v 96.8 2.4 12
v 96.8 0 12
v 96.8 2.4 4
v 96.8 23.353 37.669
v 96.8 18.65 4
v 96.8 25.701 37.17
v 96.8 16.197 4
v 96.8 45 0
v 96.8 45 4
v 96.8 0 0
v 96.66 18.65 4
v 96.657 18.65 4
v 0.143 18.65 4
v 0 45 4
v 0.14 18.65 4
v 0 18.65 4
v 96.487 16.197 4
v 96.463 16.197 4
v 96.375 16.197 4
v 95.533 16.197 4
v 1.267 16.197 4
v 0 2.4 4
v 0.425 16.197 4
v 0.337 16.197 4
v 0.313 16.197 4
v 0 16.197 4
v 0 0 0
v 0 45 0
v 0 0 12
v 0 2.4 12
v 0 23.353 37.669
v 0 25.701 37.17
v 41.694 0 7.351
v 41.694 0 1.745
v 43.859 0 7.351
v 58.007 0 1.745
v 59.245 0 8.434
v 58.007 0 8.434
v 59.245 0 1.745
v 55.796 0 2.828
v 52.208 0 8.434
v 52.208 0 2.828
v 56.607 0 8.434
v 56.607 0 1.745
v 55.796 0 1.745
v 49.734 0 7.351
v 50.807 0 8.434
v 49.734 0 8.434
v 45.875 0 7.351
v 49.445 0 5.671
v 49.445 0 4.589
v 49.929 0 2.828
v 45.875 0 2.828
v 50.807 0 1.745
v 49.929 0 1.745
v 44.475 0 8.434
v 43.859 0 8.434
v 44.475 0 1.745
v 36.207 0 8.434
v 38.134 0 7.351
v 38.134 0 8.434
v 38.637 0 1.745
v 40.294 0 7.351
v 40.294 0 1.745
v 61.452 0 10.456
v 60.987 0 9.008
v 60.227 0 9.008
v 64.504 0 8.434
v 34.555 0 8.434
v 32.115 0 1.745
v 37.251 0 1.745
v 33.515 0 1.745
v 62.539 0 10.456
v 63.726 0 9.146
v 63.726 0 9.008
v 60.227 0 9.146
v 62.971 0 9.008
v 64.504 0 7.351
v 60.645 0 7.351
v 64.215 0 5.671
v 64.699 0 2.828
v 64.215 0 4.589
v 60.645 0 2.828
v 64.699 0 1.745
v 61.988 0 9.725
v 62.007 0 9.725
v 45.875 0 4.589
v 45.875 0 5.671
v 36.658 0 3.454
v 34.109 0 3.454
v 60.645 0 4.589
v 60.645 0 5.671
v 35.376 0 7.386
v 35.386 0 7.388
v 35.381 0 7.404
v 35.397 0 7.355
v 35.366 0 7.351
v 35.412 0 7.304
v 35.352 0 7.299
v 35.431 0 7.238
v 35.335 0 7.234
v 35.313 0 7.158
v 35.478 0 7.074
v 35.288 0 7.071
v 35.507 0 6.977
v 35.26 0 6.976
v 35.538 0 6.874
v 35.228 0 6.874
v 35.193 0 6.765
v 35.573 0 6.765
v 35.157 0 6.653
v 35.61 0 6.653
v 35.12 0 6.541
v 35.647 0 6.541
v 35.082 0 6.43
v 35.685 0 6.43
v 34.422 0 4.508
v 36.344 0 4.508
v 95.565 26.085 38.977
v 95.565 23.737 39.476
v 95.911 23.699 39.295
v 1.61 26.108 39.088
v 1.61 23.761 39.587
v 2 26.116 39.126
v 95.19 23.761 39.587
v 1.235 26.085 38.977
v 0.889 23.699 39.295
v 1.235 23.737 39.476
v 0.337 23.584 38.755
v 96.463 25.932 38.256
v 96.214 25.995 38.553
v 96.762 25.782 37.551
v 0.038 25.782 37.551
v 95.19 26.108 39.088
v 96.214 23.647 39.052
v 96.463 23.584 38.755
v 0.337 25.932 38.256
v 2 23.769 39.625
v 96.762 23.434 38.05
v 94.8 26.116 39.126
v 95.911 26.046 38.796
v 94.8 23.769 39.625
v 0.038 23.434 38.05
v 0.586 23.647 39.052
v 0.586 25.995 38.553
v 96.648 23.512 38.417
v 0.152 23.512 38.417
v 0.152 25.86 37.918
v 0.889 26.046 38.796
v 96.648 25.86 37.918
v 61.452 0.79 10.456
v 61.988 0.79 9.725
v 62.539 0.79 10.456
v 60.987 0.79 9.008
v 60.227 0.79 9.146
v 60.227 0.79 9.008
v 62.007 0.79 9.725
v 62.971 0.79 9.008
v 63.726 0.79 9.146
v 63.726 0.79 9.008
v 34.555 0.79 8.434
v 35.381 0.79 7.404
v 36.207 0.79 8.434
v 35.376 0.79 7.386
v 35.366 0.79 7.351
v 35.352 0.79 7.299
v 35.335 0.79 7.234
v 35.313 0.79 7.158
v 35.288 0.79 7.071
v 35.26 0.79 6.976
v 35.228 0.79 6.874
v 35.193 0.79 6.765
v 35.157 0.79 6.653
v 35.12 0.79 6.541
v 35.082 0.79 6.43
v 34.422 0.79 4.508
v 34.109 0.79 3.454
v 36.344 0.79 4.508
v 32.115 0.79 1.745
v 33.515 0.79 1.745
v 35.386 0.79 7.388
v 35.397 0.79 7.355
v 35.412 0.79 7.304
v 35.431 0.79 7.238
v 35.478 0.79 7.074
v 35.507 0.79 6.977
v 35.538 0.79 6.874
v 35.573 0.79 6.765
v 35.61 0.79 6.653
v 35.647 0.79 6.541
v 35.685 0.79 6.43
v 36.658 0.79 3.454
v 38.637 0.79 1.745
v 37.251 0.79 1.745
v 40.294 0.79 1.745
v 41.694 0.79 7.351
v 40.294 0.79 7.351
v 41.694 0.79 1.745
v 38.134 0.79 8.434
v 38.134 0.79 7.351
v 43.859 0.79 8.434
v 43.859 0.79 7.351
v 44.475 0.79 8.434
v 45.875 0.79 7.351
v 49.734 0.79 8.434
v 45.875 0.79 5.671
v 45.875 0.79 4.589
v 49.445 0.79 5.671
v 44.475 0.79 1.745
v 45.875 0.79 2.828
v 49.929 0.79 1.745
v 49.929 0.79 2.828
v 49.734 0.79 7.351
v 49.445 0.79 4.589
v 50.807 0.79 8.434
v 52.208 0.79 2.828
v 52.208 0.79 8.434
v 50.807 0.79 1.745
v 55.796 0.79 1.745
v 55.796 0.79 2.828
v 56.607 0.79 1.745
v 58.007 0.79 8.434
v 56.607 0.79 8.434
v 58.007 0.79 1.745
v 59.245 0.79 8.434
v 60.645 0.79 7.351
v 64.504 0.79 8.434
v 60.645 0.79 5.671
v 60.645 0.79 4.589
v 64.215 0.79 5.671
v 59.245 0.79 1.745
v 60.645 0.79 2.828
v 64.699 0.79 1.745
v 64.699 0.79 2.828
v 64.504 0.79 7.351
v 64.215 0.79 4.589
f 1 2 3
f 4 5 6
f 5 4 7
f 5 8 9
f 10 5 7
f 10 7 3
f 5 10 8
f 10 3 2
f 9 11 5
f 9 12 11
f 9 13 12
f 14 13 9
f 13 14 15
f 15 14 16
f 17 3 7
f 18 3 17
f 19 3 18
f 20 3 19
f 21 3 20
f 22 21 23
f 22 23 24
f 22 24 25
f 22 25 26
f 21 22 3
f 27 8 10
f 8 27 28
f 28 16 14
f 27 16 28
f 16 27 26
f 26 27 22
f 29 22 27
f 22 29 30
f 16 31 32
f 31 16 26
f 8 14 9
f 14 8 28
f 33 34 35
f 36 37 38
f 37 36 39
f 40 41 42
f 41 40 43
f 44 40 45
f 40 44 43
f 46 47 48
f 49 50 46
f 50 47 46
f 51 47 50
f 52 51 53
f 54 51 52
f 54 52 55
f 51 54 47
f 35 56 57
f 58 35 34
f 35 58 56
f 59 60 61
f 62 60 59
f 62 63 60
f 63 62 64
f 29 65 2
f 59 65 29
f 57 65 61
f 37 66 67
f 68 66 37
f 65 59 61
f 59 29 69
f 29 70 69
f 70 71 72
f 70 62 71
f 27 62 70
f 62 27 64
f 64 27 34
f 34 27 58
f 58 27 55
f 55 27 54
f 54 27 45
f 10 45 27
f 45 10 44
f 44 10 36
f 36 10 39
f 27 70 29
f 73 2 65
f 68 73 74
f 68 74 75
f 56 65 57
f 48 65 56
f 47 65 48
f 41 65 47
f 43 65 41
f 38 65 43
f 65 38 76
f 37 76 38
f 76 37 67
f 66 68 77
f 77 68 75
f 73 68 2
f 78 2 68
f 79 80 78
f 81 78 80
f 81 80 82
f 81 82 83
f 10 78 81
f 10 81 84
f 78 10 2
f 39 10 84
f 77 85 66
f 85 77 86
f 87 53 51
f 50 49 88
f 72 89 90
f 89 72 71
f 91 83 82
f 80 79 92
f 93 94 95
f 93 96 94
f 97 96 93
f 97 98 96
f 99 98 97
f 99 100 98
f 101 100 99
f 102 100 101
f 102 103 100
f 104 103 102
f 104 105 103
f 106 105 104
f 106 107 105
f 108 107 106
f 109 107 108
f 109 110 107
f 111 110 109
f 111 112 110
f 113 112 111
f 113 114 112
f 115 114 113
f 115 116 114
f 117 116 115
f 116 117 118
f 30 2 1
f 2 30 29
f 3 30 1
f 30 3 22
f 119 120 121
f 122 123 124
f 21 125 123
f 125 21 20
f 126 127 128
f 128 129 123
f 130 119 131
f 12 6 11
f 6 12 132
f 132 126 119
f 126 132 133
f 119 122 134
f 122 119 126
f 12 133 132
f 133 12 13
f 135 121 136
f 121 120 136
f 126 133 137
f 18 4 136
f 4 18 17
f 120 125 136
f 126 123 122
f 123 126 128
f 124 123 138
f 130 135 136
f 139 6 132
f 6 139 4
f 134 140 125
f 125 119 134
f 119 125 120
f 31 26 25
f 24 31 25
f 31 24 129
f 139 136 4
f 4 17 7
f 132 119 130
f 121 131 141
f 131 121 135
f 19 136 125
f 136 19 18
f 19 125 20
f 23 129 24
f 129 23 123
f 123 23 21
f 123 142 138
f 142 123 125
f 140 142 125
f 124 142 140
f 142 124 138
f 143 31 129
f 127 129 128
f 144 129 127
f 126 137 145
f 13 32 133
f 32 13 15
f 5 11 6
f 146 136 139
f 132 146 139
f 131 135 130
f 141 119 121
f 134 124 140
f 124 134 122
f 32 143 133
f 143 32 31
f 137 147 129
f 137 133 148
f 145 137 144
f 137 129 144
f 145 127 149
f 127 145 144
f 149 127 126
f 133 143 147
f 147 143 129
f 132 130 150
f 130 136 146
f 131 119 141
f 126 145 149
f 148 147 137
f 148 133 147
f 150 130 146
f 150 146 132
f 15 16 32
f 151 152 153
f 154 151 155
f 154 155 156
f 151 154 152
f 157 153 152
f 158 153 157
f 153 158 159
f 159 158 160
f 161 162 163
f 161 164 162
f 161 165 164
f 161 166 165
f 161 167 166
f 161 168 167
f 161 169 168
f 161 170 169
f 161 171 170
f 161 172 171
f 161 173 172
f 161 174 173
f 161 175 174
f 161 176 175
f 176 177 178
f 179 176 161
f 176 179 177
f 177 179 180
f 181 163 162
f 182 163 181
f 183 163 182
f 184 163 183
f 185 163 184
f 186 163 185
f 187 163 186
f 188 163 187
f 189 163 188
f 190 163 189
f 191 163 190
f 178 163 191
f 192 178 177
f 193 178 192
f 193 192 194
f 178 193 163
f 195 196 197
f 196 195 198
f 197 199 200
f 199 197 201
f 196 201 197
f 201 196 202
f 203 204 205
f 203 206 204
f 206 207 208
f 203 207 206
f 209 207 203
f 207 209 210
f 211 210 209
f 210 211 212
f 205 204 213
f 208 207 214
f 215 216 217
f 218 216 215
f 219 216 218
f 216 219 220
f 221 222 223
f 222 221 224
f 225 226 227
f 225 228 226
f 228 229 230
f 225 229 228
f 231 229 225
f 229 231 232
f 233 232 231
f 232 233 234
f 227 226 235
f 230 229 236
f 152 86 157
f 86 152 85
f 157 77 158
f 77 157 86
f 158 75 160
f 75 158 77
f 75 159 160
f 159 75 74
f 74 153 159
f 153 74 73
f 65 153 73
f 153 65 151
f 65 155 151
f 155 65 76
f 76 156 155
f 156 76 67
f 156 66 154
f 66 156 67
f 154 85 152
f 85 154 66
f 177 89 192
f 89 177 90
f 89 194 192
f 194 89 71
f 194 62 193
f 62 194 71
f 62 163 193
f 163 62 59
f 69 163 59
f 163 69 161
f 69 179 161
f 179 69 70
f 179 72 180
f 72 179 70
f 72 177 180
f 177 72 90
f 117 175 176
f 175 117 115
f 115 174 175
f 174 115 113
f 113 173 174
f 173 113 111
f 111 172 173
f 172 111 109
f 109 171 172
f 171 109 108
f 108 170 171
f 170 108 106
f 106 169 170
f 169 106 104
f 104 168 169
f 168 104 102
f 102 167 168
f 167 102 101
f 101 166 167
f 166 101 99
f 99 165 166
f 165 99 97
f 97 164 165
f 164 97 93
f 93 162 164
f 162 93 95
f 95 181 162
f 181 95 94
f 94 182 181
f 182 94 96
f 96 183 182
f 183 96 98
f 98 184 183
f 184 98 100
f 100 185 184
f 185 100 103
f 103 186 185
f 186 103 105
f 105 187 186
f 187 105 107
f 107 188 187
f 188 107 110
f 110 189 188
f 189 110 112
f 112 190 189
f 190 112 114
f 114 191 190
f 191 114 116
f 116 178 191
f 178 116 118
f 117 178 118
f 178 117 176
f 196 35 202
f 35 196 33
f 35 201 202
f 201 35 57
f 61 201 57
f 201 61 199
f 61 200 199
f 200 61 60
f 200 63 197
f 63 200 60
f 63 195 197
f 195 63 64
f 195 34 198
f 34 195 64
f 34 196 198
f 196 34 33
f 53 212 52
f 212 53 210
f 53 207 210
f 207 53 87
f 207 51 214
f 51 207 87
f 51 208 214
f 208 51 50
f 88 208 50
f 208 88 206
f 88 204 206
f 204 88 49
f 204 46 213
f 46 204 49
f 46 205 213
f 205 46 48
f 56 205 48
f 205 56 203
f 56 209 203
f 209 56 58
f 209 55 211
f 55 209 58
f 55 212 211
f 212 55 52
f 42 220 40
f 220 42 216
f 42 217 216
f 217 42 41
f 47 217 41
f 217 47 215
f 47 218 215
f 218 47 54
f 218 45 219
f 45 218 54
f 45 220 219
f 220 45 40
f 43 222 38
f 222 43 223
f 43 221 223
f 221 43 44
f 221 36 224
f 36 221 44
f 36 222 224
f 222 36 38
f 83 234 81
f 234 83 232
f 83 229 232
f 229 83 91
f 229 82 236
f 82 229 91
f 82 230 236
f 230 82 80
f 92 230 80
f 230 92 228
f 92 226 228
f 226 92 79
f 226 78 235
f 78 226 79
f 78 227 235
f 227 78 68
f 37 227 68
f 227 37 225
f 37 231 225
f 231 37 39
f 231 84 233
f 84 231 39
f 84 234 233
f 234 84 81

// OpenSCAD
// Porta-cartão de mesa - impressão 3D
card_w = 90;         // largura do cartão (mm)
card_h = 50;         // altura do cartão (mm)
stack = 12;          // espessura da pilha de cartões (mm)
wall = 2.4;          // espessura das paredes (mm)
clearance = 1;       // folga para os cartões (mm)
tilt = 12;           // inclinação do encosto (graus)
base_d = 45;         // profundidade da base (mm)
base_h = 4;          // altura da base (mm)
lip_h = 12;          // altura da aba da frente (mm)
back_h = 40;         // altura do encosto (mm)
word = "ATELIÊ";     // texto gravado
font_size = 7;       // altura da letra (mm)
engrave = 0.8;       // profundidade da gravação (mm)

body_w = card_w + 2 * clearance + 2 * wall;
pocket = stack + clearance;

corner_r = 2;        // raio dos cantos do encosto (mm)
corner_fn = 32;      // segmentos dos cantos arredondados

module rounded_plate(size, r) {
    hull()
        for (x = [r, size[0] - r], z = [r, size[2] - r])
            translate([x, 0, z])
                rotate([-90, 0, 0])
                    cylinder(r = r, h = size[1], $fn = corner_fn);
}

difference() {
    union() {
        cube([body_w, base_d, base_h]);
        cube([body_w, wall, lip_h]);
        translate([0, wall + pocket + wall, 0])
            rotate([-tilt, 0, 0])
                translate([0, -wall, 0])
                    rounded_plate([body_w, wall, back_h], 2);
    }
    translate([body_w / 2, -0.01, lip_h / 2])
        rotate([90, 0, 0])
            translate([0, 0, -engrave])
                linear_extrude(engrave + 0.01)
                    text(word, size = font_size, font = "Liberation Sans:style=Bold",
                         halign = "center", valign = "center");
}

echo(str("Largura: ", body_w, " mm"));
echo(str("Profundidade: ", base_d, " mm"));
echo(str("Altura: ", back_h * cos(tilt), " mm"));
